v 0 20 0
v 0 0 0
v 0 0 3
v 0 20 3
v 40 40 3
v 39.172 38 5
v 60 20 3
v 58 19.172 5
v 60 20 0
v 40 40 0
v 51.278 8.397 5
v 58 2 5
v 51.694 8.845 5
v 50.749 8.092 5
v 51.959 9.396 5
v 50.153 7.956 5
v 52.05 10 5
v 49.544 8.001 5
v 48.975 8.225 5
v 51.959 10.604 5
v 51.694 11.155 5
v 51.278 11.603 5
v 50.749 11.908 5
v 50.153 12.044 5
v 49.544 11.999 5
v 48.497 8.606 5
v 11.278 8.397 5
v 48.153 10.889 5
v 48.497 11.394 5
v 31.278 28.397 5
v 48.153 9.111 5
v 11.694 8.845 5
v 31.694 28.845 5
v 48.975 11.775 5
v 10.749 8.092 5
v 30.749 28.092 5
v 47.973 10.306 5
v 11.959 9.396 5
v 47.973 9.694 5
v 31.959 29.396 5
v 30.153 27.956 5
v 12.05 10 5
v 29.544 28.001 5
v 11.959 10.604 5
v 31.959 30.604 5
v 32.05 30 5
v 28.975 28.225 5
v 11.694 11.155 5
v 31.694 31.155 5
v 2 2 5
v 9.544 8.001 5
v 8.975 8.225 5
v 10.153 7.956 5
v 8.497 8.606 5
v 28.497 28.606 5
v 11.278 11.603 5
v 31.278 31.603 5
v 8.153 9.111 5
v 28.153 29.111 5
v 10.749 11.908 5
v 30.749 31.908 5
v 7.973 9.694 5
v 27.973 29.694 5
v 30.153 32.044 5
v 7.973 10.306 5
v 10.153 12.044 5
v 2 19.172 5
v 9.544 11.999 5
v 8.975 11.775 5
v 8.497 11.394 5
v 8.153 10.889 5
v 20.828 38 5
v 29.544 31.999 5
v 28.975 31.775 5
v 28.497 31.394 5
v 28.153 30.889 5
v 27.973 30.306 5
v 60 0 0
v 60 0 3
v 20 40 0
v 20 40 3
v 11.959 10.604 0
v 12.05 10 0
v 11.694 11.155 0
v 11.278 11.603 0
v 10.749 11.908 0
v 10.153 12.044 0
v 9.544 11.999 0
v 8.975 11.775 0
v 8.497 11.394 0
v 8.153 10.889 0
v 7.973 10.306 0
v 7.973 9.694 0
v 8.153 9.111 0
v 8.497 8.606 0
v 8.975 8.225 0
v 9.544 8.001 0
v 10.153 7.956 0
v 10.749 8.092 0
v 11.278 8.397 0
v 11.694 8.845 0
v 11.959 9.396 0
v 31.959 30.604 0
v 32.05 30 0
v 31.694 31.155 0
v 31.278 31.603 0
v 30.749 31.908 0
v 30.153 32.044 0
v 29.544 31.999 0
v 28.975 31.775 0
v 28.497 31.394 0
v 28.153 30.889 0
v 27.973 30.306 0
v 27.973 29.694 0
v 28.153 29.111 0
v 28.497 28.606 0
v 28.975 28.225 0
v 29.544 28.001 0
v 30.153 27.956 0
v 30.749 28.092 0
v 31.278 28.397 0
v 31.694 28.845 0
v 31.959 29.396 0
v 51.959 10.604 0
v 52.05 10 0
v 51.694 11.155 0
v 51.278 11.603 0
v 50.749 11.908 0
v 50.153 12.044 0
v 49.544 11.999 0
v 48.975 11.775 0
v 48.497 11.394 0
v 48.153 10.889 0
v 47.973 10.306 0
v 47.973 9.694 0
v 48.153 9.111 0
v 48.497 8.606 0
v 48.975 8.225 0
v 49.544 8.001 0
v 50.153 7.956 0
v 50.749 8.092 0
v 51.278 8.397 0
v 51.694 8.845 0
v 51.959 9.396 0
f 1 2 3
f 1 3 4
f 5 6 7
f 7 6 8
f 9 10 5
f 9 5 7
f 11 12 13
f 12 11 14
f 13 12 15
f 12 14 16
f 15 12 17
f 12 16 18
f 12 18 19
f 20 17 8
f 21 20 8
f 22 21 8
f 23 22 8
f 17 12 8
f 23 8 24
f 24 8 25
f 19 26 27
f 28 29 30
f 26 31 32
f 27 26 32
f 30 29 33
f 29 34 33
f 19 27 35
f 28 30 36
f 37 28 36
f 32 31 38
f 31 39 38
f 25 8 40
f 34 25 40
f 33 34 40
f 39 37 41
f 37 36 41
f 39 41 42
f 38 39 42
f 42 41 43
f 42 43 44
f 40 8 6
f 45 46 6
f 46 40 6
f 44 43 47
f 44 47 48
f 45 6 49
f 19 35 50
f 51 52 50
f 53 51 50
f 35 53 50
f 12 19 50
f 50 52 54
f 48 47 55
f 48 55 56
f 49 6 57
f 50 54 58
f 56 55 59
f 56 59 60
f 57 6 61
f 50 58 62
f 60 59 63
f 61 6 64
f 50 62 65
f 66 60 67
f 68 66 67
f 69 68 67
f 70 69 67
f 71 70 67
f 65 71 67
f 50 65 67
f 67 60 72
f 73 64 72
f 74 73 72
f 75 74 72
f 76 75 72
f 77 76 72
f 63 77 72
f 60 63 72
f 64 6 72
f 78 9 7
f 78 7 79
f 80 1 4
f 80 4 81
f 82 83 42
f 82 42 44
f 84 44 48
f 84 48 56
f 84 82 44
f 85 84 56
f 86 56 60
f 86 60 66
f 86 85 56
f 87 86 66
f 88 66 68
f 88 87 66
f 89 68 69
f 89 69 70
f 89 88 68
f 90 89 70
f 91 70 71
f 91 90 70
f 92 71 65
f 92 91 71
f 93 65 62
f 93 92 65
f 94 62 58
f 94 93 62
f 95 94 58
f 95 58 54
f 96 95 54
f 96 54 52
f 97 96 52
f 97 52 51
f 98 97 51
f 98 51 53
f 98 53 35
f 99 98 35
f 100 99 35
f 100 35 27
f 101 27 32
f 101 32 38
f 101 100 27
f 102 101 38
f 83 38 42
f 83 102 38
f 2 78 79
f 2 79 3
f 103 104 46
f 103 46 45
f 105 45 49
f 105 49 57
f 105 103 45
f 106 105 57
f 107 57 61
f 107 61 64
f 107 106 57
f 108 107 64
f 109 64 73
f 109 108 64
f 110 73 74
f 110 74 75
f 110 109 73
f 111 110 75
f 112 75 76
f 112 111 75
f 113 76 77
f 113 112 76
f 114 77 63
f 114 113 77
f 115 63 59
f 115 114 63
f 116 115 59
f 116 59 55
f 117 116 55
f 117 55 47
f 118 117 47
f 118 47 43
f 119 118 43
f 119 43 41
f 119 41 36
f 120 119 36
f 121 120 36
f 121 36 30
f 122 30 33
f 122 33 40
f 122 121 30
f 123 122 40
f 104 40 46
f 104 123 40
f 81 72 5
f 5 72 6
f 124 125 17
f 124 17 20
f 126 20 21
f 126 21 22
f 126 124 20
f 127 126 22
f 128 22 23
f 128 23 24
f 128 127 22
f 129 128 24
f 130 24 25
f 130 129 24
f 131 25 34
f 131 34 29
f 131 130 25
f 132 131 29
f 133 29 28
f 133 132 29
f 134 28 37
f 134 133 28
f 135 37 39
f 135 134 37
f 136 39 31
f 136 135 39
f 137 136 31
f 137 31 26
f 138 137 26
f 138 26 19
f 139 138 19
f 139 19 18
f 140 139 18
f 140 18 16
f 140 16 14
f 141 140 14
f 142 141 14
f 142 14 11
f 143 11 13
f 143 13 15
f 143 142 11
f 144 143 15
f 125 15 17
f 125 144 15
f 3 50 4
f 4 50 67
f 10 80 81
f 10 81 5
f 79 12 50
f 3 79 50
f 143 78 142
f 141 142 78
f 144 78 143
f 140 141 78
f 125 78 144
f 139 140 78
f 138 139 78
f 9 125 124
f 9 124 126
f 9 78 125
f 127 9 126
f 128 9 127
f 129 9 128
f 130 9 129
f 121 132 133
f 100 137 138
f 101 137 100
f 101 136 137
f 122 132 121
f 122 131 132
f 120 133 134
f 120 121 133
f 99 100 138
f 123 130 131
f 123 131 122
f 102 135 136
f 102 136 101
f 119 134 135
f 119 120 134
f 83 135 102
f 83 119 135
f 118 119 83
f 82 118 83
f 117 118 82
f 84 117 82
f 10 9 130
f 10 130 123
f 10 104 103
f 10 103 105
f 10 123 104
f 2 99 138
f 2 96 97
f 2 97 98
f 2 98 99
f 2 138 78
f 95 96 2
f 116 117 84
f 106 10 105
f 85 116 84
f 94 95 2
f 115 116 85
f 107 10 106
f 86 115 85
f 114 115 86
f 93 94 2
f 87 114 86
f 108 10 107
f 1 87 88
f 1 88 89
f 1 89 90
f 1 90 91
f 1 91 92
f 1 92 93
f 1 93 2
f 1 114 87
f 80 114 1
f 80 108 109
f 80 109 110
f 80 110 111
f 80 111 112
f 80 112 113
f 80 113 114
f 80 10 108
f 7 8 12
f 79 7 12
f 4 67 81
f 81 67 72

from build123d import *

# Parameters (mm, degrees)
SKETCH_R      = 2.05
EXTRUDE_DEPTH = 5
CHAMFER_SIZE  = 2


with BuildPart() as part:
    # Sketch → Extrude (new body)
    with BuildSketch(Plane.XY):
        Polygon((0, 0), (0, 20), (20, 40), (40, 40), (60, 20), (60, 0), align=None)
        with Locations((10, 10)):
            Circle(SKETCH_R, mode=Mode.SUBTRACT)
        with Locations((50, 10)):
            Circle(SKETCH_R, mode=Mode.SUBTRACT)
        with Locations((30, 30)):
            Circle(SKETCH_R, mode=Mode.SUBTRACT)
    extrude(amount=EXTRUDE_DEPTH)

    # Chamfer
    chamfer_edges = [part.edges().sort_by_distance(p)[0] for p in [
        (0, 10, 5),
        (10, 30, 5),
        (30, 40, 5),
        (50, 30, 5),
        (60, 10, 5),
        (30, 0, 5),
    ]]
    chamfer(chamfer_edges, length=CHAMFER_SIZE)


solid = part.part
